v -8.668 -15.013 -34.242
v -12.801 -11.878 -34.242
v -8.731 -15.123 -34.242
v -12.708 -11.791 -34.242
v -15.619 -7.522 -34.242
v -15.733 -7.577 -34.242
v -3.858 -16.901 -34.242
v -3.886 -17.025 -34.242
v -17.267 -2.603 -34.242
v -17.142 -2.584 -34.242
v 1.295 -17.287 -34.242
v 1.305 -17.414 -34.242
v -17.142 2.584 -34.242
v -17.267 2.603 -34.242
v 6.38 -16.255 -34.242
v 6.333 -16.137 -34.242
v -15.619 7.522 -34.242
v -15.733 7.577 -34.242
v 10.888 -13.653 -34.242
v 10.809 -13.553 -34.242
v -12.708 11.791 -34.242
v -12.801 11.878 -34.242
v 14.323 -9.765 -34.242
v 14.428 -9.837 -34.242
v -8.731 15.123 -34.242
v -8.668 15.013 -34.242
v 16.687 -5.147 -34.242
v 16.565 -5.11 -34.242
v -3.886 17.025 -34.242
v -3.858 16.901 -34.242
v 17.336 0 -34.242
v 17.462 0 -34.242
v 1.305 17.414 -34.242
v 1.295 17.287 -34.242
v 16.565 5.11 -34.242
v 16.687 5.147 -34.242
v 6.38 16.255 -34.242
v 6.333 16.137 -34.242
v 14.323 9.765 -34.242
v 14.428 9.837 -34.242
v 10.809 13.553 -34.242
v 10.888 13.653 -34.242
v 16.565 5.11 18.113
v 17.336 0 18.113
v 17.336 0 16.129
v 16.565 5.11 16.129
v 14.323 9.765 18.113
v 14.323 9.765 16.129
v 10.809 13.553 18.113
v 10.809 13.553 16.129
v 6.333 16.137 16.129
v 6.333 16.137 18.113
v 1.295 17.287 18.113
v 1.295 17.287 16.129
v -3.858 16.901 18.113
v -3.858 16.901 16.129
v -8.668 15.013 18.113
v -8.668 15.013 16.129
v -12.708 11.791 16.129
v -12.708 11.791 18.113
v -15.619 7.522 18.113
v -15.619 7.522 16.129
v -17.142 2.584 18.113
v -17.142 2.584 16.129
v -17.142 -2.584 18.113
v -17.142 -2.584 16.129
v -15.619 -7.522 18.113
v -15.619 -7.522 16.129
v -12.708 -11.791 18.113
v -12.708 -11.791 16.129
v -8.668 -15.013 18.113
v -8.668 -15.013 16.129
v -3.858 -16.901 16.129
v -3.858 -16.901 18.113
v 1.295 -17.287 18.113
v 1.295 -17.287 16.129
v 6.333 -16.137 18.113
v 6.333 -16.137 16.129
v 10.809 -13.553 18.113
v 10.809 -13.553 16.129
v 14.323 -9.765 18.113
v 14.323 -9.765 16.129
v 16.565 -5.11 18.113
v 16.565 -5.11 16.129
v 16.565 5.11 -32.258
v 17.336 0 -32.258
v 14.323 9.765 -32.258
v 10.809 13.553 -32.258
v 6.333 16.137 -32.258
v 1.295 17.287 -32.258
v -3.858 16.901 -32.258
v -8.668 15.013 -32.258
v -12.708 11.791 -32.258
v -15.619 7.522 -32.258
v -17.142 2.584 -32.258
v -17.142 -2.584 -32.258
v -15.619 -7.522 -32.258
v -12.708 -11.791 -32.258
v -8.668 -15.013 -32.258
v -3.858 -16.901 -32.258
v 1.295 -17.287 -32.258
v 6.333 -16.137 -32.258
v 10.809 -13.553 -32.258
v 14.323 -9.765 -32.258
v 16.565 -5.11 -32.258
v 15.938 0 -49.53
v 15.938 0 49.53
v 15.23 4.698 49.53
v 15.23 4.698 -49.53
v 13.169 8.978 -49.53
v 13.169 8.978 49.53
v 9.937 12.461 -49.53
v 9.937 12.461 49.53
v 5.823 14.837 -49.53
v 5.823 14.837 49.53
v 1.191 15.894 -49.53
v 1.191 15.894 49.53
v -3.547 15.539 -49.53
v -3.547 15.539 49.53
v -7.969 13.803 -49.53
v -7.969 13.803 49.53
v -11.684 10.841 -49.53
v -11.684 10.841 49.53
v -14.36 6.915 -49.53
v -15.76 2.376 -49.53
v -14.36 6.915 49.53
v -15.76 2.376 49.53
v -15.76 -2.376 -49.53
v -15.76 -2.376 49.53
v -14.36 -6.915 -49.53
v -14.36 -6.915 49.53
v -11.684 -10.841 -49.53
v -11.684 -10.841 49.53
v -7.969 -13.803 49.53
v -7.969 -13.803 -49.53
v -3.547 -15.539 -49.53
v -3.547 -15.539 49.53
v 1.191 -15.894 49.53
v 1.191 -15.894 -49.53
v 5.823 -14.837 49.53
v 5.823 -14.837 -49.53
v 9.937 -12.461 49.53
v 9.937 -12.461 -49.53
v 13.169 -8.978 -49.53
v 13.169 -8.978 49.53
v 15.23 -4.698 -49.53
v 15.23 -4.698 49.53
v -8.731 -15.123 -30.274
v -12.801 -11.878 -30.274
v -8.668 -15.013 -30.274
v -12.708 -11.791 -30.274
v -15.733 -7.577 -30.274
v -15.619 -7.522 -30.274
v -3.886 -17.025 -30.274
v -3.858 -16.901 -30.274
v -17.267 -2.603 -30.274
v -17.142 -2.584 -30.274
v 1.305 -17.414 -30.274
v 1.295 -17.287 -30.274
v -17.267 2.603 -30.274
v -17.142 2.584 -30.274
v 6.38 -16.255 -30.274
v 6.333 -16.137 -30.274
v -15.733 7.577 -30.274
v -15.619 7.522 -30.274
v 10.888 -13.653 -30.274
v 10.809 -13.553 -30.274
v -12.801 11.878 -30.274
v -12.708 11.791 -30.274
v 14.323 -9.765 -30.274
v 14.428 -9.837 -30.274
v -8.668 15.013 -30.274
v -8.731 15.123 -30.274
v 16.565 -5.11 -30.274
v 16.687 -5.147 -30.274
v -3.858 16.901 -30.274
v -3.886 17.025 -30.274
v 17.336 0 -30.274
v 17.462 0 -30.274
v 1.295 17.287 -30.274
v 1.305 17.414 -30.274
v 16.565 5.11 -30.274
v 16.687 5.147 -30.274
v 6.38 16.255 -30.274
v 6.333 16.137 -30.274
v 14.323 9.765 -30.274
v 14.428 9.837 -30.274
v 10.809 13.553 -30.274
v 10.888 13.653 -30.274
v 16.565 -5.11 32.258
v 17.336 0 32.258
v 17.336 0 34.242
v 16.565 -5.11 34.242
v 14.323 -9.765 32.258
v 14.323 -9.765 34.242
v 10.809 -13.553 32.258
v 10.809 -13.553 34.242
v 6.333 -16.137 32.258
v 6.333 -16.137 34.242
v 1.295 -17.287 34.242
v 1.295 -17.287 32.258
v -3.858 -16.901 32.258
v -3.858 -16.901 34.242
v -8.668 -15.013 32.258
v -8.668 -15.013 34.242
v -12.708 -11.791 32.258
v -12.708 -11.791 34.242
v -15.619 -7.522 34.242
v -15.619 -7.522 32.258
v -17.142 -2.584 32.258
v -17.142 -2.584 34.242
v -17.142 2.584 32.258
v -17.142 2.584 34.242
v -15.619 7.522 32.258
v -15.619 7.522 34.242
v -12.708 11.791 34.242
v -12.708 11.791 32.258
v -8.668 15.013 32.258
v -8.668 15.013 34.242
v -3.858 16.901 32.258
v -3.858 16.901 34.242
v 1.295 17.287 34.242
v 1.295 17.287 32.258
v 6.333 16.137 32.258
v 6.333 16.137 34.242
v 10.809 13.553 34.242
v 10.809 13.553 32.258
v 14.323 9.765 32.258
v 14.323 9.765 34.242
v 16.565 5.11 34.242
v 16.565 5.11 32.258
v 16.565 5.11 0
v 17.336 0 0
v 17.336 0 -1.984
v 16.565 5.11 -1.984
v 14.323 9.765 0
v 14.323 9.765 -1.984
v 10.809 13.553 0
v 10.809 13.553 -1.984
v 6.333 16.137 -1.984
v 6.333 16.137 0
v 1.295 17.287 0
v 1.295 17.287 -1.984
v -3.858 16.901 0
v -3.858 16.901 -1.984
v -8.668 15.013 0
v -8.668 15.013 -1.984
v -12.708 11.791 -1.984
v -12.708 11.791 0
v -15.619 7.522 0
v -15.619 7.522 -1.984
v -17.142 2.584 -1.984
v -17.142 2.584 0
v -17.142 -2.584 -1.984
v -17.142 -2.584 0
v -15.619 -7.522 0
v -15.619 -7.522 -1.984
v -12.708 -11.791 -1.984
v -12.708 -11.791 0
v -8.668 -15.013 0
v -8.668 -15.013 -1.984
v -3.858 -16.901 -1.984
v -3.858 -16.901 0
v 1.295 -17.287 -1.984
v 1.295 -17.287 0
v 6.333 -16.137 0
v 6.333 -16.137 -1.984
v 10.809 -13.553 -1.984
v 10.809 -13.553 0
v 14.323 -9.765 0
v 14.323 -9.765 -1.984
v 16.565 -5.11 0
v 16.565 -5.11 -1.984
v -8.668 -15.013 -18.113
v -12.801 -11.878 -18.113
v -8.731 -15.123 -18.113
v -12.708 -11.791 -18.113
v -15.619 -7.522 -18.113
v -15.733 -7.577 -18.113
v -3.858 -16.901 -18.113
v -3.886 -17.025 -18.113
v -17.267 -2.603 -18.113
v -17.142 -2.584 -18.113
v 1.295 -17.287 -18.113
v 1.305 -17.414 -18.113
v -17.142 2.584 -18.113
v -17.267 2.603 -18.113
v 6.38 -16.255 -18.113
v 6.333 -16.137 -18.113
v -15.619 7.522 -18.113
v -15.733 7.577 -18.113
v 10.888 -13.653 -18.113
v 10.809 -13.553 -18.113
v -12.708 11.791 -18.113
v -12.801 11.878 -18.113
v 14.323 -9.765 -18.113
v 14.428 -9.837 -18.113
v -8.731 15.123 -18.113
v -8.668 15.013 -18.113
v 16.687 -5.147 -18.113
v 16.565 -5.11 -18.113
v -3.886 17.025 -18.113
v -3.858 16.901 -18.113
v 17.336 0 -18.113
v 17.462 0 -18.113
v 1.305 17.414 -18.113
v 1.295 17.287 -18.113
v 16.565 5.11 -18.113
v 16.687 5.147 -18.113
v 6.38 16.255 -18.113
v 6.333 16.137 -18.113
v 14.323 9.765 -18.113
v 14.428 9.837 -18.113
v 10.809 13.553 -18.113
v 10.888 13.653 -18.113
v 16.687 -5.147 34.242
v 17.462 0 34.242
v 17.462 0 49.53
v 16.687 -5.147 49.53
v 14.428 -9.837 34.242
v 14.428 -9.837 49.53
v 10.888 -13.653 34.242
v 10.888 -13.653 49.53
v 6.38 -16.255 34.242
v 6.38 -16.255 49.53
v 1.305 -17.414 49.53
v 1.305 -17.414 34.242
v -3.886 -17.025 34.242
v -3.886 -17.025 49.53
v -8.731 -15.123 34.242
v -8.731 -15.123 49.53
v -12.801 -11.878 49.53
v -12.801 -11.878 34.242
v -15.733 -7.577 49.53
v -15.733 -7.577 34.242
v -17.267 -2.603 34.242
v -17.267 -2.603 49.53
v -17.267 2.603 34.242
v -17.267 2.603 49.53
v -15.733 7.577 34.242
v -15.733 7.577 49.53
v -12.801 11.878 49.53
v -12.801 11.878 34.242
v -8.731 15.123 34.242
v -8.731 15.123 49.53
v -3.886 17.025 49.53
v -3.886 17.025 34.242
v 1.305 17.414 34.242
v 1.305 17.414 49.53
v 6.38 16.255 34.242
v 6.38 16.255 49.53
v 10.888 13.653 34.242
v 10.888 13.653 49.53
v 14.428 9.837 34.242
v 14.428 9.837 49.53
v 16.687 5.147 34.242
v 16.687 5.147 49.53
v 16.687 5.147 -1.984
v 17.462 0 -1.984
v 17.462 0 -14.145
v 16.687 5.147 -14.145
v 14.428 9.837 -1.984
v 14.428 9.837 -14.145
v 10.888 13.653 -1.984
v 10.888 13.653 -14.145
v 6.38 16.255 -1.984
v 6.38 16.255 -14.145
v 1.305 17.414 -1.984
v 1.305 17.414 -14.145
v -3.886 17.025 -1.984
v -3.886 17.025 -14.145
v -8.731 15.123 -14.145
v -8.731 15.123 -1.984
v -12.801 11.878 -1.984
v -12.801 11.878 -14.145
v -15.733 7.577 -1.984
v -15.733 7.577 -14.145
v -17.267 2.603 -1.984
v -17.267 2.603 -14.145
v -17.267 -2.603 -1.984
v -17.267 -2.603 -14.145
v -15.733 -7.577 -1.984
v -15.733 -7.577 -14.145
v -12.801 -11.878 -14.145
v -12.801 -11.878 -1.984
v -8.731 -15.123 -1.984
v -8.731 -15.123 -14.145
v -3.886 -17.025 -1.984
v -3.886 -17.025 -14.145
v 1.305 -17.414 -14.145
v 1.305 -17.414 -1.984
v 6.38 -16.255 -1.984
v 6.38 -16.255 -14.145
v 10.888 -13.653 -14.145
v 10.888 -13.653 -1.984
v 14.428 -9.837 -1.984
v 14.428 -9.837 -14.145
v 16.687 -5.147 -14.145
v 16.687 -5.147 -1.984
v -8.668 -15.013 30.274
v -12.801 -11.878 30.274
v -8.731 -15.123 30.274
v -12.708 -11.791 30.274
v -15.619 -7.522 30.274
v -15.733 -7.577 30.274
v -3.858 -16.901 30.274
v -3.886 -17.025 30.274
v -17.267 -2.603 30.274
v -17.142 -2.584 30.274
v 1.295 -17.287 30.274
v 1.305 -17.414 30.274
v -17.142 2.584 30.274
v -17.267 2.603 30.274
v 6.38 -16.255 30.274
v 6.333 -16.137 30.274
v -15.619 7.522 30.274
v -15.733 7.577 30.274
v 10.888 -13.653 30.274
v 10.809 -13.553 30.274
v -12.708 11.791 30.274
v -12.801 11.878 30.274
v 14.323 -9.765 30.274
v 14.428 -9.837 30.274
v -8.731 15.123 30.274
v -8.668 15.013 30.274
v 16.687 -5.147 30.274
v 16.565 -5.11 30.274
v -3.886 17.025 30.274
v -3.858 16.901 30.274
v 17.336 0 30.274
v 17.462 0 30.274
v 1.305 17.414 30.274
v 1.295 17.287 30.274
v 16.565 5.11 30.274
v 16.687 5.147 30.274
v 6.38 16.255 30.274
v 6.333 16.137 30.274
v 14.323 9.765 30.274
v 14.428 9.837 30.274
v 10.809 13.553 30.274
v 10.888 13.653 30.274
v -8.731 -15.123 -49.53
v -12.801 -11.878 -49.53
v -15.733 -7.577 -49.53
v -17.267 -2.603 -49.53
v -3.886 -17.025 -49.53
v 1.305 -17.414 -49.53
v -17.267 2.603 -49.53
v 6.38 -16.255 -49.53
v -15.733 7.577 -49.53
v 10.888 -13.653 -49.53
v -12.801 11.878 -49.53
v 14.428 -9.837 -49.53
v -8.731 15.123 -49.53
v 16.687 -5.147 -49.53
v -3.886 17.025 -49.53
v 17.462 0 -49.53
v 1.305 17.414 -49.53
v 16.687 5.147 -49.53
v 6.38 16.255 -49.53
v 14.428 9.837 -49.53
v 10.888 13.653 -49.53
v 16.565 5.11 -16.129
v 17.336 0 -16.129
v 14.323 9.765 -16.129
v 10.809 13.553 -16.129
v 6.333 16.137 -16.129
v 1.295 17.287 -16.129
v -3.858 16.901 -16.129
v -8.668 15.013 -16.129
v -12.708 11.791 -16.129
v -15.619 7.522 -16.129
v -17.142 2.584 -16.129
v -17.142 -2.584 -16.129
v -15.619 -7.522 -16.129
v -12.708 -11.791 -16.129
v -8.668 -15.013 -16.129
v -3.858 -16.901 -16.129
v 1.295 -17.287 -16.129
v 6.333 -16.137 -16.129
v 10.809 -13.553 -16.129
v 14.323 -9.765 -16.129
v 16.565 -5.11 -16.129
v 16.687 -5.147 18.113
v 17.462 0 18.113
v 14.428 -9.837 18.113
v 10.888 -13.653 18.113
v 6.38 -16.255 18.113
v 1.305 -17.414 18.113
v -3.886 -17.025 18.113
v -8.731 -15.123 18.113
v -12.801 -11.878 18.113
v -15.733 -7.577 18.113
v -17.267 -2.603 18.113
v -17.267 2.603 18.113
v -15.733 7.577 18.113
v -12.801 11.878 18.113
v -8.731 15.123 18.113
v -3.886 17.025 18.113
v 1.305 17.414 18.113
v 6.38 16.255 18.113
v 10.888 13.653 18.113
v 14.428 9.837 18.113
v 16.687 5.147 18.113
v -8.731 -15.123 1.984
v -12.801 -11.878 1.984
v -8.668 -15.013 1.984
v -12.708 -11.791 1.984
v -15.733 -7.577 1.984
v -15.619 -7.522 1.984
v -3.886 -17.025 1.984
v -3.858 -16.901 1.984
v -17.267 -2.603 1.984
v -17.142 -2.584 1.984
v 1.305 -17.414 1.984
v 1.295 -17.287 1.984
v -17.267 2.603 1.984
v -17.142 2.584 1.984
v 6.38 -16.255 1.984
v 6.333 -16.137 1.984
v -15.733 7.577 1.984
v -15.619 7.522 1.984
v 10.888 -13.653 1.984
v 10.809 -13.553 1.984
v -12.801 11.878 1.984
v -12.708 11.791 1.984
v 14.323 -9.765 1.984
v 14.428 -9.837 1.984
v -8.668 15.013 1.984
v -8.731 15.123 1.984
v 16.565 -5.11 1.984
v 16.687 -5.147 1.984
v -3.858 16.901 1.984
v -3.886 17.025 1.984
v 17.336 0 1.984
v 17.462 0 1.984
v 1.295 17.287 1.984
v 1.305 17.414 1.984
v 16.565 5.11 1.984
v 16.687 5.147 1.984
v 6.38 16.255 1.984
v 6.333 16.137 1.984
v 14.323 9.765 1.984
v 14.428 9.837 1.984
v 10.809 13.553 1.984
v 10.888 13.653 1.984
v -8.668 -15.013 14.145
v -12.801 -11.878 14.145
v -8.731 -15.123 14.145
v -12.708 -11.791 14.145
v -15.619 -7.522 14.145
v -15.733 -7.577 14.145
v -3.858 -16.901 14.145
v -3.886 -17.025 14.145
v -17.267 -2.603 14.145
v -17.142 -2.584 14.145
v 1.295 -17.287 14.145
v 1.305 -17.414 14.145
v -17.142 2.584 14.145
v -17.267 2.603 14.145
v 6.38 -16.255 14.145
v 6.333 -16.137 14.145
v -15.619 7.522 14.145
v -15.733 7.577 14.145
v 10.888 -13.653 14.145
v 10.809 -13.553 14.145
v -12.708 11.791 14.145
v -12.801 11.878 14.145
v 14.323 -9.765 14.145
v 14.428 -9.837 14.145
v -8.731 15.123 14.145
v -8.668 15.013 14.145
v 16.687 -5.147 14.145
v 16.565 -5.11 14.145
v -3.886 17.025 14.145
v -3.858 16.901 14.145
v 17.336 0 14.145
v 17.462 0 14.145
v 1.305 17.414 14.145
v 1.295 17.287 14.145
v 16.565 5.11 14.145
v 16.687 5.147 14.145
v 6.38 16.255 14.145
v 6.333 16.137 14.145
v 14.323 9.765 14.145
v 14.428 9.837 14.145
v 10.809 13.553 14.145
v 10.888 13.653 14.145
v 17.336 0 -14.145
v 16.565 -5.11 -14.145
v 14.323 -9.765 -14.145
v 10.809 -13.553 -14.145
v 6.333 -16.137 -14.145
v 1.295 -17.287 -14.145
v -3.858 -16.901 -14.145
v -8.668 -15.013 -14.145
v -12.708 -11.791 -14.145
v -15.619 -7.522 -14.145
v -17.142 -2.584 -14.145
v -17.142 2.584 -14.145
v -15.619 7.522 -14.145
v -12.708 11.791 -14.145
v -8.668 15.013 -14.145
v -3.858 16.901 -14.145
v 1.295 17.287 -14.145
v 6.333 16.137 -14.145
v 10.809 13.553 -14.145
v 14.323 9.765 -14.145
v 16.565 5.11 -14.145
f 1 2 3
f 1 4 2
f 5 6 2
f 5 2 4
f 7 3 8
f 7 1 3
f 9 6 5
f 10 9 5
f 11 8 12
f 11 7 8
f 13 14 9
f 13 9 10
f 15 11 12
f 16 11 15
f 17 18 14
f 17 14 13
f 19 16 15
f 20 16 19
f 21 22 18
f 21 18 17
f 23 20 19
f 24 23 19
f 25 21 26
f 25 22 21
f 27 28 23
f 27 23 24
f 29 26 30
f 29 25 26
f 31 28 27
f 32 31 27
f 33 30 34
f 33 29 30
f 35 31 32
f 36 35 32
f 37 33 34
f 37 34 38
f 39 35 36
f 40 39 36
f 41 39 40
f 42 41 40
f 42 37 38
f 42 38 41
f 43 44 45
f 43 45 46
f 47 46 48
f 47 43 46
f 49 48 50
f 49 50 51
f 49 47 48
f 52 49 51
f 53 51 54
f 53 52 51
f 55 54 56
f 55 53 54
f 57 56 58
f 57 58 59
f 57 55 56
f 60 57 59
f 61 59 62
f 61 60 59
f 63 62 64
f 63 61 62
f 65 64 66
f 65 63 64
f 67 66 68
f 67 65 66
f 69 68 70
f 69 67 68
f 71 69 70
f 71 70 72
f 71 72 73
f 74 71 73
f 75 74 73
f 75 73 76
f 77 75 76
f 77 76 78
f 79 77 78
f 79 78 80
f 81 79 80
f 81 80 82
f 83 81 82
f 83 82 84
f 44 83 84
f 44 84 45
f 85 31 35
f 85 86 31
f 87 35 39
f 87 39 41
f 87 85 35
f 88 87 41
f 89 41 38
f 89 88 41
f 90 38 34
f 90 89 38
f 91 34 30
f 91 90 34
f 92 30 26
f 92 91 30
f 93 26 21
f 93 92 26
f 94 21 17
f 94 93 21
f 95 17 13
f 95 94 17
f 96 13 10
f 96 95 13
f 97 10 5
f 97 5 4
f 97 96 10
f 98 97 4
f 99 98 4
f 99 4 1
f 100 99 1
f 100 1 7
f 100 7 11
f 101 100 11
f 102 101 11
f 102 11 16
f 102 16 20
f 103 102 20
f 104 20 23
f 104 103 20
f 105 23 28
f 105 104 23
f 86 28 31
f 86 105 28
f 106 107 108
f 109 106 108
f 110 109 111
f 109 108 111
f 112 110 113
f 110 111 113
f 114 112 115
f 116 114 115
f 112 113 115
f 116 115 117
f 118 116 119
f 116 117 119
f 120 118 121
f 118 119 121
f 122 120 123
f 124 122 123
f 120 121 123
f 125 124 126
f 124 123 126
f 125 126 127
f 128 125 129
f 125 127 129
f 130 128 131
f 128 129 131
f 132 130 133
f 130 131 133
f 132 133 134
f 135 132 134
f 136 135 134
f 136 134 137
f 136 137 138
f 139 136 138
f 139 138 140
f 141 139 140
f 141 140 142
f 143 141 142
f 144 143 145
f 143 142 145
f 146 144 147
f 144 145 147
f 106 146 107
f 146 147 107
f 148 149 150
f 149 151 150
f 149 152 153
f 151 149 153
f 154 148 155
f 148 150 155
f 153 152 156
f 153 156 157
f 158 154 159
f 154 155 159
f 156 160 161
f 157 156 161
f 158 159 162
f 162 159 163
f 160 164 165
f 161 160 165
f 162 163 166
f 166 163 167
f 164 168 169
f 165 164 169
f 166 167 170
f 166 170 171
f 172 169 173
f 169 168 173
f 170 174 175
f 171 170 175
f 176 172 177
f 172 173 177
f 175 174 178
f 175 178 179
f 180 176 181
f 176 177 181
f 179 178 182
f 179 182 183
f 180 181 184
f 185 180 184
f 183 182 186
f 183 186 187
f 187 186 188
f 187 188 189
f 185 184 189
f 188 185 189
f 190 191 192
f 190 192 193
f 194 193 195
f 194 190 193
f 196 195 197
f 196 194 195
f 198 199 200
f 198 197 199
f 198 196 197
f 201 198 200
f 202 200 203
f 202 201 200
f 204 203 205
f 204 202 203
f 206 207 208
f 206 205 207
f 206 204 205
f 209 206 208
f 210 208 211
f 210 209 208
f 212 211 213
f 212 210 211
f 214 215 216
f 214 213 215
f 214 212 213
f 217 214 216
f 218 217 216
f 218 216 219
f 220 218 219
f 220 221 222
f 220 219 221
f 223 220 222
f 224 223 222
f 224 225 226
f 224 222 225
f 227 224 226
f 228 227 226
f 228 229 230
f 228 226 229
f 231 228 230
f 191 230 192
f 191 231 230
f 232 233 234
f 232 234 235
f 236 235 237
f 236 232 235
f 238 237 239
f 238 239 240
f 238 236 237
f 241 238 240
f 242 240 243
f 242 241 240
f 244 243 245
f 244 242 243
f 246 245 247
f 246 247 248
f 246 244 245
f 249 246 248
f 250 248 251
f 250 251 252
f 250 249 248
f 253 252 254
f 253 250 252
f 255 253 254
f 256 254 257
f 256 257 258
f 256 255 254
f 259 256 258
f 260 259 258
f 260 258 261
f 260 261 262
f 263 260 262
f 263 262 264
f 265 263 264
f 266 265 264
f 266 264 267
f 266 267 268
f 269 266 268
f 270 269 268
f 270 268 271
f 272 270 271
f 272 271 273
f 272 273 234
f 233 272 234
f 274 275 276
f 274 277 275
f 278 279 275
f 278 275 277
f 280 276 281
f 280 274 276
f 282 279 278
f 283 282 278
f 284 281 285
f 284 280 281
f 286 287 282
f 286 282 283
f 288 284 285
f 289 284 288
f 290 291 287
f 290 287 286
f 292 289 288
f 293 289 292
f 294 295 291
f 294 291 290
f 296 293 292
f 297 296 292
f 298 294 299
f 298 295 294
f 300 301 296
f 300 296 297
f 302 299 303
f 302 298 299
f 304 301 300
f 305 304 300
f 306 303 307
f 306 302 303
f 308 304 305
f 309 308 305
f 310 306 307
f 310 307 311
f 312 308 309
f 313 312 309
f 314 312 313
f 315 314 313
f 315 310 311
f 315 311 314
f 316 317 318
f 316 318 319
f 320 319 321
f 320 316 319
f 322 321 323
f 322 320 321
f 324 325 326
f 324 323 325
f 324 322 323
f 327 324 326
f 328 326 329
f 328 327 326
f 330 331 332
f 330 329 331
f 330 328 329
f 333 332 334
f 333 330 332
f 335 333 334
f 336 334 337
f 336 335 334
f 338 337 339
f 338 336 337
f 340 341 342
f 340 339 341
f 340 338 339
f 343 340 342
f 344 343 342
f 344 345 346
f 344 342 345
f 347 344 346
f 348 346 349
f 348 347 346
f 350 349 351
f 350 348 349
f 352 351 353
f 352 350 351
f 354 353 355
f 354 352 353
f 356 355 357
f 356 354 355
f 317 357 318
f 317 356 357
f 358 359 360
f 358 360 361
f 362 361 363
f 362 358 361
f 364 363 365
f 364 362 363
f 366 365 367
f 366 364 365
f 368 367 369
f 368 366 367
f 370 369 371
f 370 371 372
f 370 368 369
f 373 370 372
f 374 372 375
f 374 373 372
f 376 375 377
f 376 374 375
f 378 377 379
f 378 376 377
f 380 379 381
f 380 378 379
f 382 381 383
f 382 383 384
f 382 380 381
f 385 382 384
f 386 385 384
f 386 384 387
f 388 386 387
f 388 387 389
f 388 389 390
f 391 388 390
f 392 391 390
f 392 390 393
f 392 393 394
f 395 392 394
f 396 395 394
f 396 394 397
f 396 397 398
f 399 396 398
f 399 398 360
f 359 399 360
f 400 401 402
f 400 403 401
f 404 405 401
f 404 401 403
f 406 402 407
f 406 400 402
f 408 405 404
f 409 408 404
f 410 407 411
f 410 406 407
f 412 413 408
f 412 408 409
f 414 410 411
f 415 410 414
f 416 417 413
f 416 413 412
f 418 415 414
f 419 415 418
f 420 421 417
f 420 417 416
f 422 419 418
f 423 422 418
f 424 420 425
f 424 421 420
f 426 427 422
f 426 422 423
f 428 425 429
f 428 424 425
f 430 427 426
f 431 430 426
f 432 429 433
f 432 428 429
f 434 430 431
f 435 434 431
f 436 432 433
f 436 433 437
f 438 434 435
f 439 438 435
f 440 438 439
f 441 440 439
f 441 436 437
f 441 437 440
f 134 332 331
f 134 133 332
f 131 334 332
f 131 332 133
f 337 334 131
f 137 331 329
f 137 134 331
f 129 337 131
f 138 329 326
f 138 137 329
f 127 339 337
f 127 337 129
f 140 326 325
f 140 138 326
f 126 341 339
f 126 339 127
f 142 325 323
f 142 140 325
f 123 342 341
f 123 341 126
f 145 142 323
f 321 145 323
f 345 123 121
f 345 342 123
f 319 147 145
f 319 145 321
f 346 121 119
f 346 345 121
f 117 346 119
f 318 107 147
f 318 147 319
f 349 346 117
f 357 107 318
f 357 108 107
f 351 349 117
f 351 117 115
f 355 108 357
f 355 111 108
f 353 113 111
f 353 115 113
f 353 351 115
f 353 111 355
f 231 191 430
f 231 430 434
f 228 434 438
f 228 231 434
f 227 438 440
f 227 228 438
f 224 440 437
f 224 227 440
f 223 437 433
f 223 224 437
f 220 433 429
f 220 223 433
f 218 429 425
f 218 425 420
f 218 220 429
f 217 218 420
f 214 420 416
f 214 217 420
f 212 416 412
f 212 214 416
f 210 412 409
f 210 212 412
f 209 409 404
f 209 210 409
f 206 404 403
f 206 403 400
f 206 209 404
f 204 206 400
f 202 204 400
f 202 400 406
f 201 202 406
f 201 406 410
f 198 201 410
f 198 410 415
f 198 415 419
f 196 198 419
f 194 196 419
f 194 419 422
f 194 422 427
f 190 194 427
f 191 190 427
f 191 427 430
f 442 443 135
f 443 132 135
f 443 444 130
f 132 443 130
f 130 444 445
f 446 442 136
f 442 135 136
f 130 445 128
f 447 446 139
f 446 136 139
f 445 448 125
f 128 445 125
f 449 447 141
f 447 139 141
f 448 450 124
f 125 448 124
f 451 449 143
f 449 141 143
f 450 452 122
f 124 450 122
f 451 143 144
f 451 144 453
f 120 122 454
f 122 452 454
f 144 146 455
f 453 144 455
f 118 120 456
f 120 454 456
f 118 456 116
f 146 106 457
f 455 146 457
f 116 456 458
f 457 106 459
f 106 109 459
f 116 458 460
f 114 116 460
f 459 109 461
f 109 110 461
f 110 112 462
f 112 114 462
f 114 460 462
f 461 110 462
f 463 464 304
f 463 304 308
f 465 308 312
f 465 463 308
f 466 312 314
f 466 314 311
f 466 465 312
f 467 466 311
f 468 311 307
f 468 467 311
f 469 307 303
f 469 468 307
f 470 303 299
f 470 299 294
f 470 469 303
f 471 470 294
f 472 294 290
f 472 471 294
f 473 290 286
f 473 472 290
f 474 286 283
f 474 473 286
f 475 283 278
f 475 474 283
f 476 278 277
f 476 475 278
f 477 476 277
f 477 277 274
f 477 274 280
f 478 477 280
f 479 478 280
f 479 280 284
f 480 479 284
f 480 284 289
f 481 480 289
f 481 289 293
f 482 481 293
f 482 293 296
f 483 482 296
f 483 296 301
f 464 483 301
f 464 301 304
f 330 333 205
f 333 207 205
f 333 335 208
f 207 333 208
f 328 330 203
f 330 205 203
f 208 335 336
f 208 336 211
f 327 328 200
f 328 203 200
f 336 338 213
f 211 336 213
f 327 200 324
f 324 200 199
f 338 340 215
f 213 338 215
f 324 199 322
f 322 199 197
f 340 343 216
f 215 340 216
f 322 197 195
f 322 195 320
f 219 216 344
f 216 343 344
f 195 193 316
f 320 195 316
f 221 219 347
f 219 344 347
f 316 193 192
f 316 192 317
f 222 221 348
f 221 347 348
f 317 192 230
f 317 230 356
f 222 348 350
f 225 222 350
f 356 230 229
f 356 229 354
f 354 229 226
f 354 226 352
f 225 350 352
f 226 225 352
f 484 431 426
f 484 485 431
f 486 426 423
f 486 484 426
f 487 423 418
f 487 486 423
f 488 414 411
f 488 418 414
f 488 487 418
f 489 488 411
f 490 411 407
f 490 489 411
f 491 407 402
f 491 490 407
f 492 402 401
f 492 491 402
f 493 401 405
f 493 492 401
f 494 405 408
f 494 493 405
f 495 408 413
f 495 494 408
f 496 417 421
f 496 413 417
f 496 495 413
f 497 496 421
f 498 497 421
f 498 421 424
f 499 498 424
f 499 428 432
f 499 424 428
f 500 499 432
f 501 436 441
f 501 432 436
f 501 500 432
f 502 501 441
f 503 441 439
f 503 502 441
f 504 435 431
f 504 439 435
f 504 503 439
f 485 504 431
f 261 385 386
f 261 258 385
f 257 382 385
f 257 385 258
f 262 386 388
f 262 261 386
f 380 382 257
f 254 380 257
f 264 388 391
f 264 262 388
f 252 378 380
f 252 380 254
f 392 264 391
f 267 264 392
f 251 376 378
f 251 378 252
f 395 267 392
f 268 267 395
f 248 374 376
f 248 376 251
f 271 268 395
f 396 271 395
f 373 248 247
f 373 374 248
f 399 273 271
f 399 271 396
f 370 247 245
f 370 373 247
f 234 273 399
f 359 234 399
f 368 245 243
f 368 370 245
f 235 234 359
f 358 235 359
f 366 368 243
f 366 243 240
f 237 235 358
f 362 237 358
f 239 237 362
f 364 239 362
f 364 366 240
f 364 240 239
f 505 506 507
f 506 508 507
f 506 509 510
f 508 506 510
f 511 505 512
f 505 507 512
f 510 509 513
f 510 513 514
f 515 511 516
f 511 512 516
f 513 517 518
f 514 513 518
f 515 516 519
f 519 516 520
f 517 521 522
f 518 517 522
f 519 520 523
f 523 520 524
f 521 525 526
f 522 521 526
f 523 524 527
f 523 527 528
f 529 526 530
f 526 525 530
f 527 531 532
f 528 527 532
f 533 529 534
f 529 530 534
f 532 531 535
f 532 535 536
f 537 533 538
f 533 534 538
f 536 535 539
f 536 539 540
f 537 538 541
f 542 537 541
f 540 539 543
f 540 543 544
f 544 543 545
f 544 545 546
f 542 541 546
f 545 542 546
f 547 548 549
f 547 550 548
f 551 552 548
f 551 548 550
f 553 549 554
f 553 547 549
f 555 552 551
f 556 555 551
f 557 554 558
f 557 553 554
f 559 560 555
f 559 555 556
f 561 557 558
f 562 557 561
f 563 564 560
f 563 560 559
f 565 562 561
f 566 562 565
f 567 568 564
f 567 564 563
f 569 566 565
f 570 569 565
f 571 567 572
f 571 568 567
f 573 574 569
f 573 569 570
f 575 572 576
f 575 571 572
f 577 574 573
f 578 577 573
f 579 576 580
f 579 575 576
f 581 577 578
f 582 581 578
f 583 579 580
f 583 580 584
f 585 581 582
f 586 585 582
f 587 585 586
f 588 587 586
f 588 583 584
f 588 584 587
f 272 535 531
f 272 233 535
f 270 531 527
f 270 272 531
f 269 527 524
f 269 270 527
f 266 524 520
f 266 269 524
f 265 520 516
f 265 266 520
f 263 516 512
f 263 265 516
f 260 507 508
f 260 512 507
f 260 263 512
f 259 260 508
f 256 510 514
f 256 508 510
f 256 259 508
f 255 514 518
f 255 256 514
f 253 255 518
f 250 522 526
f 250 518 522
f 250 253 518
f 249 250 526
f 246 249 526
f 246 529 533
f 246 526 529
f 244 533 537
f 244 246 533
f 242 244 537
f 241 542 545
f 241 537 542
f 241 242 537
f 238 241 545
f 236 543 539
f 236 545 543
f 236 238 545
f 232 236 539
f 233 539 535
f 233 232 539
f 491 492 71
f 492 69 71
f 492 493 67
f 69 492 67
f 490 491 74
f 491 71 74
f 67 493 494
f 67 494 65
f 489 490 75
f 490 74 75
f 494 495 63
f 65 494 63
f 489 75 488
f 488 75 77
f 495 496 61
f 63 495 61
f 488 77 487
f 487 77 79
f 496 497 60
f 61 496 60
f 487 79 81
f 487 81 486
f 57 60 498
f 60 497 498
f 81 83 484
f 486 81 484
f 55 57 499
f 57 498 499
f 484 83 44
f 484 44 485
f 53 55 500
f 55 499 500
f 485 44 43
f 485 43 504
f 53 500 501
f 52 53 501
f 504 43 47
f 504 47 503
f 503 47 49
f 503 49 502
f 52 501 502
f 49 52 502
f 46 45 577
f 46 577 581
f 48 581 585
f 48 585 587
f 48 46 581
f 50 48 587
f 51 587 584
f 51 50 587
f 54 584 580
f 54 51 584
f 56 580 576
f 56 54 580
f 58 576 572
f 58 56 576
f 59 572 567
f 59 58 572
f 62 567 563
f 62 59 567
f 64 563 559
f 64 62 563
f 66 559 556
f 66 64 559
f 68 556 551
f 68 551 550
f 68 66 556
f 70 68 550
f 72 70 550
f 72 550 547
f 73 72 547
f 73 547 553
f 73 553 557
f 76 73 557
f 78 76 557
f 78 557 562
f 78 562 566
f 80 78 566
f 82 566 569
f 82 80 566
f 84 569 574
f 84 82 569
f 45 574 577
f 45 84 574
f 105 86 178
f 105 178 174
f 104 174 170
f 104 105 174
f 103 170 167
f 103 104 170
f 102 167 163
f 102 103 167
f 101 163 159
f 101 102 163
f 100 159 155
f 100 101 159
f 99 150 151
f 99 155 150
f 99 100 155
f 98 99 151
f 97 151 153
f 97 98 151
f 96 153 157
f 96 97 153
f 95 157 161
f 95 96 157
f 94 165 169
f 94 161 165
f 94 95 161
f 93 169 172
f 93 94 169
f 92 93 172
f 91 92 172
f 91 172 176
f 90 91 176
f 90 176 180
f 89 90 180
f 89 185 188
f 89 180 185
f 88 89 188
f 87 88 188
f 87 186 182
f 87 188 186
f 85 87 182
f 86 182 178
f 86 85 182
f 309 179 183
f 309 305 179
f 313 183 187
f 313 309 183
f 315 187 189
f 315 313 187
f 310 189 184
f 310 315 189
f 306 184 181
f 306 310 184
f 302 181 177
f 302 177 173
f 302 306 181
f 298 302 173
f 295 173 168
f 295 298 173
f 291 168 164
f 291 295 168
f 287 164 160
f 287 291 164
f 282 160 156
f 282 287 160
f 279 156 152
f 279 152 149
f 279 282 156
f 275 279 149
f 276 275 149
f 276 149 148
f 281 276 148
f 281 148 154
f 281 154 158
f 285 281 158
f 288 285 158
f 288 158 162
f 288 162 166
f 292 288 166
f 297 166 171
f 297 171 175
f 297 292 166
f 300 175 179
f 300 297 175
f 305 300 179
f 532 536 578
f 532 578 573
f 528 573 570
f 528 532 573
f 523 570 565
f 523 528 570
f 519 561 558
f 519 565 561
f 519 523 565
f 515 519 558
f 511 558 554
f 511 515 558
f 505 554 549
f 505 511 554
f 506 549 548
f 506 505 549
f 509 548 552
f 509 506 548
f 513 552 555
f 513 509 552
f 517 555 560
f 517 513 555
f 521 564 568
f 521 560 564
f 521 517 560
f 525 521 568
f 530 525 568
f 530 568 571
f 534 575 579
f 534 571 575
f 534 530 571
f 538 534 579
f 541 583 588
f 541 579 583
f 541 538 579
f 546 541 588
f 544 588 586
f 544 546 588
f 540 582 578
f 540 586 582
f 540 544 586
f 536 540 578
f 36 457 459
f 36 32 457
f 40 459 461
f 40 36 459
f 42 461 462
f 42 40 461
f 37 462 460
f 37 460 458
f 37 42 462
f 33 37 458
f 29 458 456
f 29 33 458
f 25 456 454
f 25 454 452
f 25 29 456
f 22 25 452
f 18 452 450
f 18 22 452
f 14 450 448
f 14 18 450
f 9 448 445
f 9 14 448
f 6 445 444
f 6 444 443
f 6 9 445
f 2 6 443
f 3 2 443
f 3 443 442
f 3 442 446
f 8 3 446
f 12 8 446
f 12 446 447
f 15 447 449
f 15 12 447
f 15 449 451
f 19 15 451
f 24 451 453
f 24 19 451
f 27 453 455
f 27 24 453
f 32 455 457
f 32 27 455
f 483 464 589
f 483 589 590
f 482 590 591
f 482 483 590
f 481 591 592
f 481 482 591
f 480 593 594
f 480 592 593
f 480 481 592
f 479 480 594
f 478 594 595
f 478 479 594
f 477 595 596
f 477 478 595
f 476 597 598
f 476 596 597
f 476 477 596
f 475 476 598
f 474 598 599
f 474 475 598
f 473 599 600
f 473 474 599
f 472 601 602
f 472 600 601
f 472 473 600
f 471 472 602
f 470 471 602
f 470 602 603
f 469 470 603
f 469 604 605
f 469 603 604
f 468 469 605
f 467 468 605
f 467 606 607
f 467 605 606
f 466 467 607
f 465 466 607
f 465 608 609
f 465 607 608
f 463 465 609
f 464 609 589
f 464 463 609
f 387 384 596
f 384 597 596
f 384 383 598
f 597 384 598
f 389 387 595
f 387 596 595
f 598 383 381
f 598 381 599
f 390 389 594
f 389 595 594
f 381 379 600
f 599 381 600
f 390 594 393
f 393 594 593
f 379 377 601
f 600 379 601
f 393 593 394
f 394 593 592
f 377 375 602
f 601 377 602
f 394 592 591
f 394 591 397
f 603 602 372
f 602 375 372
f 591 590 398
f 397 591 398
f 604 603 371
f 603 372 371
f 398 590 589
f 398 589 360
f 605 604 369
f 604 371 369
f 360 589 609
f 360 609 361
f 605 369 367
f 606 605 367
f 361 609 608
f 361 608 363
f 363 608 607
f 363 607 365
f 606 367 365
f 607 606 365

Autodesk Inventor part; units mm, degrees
ref_plane "YZ Plane" through (0, 0, 0) normal (1, 0, 0) x (0, 1, 0)
ref_plane "XZ Plane" through (0, 0, 0) normal (0, 1, 0) x (-1, 0, 0)
ref_plane "XY Plane" through (0, 0, 0) normal (0, 0, 1) x (1, 0, 0)
sketch "Sketch1" plane through (0, 0, 0) normal (0, 0, 1) x (1, 0, 0)
  circle A0 centre (0, 0) radius 17.4625
  dimension "d0" = 34.925
extrude "Extrusion1" add sketch "Sketch1" along normal mid plane 99.06
sketch "Sketch2" plane through (0, 0, 49.53) normal (0, 0, 1) x (1, 0, 0)
  circle A0 centre (0, 0) radius 15.9385
  circle A1 centre (0, 0) radius 17.4625 projected
  dimension "d16" = 1.524
extrude "Extrusion2" cut sketch "Sketch2" against normal blind 99.06 contours A0
sketch "Sketch3" plane through (0, 0, 0) normal (0, 0, 1) x (1, 0, 0)
  circle A0 centre (0, 0) radius 17.3355
  circle A1 centre (0, 0) radius 17.4625
  dimension "d6" = 34.671
extrude "Extrusion3" cut sketch "Sketch3" along normal mid plane 3.9688
pattern_linear "Rectangular Pattern1" count 3 spacing 16.129 along (0, 0, 1) count 3 spacing 16.129 along (0, 0, -1) of "Extrusion3"
properties part number "MIddle Rod Cover" material "Stainless Steel"
